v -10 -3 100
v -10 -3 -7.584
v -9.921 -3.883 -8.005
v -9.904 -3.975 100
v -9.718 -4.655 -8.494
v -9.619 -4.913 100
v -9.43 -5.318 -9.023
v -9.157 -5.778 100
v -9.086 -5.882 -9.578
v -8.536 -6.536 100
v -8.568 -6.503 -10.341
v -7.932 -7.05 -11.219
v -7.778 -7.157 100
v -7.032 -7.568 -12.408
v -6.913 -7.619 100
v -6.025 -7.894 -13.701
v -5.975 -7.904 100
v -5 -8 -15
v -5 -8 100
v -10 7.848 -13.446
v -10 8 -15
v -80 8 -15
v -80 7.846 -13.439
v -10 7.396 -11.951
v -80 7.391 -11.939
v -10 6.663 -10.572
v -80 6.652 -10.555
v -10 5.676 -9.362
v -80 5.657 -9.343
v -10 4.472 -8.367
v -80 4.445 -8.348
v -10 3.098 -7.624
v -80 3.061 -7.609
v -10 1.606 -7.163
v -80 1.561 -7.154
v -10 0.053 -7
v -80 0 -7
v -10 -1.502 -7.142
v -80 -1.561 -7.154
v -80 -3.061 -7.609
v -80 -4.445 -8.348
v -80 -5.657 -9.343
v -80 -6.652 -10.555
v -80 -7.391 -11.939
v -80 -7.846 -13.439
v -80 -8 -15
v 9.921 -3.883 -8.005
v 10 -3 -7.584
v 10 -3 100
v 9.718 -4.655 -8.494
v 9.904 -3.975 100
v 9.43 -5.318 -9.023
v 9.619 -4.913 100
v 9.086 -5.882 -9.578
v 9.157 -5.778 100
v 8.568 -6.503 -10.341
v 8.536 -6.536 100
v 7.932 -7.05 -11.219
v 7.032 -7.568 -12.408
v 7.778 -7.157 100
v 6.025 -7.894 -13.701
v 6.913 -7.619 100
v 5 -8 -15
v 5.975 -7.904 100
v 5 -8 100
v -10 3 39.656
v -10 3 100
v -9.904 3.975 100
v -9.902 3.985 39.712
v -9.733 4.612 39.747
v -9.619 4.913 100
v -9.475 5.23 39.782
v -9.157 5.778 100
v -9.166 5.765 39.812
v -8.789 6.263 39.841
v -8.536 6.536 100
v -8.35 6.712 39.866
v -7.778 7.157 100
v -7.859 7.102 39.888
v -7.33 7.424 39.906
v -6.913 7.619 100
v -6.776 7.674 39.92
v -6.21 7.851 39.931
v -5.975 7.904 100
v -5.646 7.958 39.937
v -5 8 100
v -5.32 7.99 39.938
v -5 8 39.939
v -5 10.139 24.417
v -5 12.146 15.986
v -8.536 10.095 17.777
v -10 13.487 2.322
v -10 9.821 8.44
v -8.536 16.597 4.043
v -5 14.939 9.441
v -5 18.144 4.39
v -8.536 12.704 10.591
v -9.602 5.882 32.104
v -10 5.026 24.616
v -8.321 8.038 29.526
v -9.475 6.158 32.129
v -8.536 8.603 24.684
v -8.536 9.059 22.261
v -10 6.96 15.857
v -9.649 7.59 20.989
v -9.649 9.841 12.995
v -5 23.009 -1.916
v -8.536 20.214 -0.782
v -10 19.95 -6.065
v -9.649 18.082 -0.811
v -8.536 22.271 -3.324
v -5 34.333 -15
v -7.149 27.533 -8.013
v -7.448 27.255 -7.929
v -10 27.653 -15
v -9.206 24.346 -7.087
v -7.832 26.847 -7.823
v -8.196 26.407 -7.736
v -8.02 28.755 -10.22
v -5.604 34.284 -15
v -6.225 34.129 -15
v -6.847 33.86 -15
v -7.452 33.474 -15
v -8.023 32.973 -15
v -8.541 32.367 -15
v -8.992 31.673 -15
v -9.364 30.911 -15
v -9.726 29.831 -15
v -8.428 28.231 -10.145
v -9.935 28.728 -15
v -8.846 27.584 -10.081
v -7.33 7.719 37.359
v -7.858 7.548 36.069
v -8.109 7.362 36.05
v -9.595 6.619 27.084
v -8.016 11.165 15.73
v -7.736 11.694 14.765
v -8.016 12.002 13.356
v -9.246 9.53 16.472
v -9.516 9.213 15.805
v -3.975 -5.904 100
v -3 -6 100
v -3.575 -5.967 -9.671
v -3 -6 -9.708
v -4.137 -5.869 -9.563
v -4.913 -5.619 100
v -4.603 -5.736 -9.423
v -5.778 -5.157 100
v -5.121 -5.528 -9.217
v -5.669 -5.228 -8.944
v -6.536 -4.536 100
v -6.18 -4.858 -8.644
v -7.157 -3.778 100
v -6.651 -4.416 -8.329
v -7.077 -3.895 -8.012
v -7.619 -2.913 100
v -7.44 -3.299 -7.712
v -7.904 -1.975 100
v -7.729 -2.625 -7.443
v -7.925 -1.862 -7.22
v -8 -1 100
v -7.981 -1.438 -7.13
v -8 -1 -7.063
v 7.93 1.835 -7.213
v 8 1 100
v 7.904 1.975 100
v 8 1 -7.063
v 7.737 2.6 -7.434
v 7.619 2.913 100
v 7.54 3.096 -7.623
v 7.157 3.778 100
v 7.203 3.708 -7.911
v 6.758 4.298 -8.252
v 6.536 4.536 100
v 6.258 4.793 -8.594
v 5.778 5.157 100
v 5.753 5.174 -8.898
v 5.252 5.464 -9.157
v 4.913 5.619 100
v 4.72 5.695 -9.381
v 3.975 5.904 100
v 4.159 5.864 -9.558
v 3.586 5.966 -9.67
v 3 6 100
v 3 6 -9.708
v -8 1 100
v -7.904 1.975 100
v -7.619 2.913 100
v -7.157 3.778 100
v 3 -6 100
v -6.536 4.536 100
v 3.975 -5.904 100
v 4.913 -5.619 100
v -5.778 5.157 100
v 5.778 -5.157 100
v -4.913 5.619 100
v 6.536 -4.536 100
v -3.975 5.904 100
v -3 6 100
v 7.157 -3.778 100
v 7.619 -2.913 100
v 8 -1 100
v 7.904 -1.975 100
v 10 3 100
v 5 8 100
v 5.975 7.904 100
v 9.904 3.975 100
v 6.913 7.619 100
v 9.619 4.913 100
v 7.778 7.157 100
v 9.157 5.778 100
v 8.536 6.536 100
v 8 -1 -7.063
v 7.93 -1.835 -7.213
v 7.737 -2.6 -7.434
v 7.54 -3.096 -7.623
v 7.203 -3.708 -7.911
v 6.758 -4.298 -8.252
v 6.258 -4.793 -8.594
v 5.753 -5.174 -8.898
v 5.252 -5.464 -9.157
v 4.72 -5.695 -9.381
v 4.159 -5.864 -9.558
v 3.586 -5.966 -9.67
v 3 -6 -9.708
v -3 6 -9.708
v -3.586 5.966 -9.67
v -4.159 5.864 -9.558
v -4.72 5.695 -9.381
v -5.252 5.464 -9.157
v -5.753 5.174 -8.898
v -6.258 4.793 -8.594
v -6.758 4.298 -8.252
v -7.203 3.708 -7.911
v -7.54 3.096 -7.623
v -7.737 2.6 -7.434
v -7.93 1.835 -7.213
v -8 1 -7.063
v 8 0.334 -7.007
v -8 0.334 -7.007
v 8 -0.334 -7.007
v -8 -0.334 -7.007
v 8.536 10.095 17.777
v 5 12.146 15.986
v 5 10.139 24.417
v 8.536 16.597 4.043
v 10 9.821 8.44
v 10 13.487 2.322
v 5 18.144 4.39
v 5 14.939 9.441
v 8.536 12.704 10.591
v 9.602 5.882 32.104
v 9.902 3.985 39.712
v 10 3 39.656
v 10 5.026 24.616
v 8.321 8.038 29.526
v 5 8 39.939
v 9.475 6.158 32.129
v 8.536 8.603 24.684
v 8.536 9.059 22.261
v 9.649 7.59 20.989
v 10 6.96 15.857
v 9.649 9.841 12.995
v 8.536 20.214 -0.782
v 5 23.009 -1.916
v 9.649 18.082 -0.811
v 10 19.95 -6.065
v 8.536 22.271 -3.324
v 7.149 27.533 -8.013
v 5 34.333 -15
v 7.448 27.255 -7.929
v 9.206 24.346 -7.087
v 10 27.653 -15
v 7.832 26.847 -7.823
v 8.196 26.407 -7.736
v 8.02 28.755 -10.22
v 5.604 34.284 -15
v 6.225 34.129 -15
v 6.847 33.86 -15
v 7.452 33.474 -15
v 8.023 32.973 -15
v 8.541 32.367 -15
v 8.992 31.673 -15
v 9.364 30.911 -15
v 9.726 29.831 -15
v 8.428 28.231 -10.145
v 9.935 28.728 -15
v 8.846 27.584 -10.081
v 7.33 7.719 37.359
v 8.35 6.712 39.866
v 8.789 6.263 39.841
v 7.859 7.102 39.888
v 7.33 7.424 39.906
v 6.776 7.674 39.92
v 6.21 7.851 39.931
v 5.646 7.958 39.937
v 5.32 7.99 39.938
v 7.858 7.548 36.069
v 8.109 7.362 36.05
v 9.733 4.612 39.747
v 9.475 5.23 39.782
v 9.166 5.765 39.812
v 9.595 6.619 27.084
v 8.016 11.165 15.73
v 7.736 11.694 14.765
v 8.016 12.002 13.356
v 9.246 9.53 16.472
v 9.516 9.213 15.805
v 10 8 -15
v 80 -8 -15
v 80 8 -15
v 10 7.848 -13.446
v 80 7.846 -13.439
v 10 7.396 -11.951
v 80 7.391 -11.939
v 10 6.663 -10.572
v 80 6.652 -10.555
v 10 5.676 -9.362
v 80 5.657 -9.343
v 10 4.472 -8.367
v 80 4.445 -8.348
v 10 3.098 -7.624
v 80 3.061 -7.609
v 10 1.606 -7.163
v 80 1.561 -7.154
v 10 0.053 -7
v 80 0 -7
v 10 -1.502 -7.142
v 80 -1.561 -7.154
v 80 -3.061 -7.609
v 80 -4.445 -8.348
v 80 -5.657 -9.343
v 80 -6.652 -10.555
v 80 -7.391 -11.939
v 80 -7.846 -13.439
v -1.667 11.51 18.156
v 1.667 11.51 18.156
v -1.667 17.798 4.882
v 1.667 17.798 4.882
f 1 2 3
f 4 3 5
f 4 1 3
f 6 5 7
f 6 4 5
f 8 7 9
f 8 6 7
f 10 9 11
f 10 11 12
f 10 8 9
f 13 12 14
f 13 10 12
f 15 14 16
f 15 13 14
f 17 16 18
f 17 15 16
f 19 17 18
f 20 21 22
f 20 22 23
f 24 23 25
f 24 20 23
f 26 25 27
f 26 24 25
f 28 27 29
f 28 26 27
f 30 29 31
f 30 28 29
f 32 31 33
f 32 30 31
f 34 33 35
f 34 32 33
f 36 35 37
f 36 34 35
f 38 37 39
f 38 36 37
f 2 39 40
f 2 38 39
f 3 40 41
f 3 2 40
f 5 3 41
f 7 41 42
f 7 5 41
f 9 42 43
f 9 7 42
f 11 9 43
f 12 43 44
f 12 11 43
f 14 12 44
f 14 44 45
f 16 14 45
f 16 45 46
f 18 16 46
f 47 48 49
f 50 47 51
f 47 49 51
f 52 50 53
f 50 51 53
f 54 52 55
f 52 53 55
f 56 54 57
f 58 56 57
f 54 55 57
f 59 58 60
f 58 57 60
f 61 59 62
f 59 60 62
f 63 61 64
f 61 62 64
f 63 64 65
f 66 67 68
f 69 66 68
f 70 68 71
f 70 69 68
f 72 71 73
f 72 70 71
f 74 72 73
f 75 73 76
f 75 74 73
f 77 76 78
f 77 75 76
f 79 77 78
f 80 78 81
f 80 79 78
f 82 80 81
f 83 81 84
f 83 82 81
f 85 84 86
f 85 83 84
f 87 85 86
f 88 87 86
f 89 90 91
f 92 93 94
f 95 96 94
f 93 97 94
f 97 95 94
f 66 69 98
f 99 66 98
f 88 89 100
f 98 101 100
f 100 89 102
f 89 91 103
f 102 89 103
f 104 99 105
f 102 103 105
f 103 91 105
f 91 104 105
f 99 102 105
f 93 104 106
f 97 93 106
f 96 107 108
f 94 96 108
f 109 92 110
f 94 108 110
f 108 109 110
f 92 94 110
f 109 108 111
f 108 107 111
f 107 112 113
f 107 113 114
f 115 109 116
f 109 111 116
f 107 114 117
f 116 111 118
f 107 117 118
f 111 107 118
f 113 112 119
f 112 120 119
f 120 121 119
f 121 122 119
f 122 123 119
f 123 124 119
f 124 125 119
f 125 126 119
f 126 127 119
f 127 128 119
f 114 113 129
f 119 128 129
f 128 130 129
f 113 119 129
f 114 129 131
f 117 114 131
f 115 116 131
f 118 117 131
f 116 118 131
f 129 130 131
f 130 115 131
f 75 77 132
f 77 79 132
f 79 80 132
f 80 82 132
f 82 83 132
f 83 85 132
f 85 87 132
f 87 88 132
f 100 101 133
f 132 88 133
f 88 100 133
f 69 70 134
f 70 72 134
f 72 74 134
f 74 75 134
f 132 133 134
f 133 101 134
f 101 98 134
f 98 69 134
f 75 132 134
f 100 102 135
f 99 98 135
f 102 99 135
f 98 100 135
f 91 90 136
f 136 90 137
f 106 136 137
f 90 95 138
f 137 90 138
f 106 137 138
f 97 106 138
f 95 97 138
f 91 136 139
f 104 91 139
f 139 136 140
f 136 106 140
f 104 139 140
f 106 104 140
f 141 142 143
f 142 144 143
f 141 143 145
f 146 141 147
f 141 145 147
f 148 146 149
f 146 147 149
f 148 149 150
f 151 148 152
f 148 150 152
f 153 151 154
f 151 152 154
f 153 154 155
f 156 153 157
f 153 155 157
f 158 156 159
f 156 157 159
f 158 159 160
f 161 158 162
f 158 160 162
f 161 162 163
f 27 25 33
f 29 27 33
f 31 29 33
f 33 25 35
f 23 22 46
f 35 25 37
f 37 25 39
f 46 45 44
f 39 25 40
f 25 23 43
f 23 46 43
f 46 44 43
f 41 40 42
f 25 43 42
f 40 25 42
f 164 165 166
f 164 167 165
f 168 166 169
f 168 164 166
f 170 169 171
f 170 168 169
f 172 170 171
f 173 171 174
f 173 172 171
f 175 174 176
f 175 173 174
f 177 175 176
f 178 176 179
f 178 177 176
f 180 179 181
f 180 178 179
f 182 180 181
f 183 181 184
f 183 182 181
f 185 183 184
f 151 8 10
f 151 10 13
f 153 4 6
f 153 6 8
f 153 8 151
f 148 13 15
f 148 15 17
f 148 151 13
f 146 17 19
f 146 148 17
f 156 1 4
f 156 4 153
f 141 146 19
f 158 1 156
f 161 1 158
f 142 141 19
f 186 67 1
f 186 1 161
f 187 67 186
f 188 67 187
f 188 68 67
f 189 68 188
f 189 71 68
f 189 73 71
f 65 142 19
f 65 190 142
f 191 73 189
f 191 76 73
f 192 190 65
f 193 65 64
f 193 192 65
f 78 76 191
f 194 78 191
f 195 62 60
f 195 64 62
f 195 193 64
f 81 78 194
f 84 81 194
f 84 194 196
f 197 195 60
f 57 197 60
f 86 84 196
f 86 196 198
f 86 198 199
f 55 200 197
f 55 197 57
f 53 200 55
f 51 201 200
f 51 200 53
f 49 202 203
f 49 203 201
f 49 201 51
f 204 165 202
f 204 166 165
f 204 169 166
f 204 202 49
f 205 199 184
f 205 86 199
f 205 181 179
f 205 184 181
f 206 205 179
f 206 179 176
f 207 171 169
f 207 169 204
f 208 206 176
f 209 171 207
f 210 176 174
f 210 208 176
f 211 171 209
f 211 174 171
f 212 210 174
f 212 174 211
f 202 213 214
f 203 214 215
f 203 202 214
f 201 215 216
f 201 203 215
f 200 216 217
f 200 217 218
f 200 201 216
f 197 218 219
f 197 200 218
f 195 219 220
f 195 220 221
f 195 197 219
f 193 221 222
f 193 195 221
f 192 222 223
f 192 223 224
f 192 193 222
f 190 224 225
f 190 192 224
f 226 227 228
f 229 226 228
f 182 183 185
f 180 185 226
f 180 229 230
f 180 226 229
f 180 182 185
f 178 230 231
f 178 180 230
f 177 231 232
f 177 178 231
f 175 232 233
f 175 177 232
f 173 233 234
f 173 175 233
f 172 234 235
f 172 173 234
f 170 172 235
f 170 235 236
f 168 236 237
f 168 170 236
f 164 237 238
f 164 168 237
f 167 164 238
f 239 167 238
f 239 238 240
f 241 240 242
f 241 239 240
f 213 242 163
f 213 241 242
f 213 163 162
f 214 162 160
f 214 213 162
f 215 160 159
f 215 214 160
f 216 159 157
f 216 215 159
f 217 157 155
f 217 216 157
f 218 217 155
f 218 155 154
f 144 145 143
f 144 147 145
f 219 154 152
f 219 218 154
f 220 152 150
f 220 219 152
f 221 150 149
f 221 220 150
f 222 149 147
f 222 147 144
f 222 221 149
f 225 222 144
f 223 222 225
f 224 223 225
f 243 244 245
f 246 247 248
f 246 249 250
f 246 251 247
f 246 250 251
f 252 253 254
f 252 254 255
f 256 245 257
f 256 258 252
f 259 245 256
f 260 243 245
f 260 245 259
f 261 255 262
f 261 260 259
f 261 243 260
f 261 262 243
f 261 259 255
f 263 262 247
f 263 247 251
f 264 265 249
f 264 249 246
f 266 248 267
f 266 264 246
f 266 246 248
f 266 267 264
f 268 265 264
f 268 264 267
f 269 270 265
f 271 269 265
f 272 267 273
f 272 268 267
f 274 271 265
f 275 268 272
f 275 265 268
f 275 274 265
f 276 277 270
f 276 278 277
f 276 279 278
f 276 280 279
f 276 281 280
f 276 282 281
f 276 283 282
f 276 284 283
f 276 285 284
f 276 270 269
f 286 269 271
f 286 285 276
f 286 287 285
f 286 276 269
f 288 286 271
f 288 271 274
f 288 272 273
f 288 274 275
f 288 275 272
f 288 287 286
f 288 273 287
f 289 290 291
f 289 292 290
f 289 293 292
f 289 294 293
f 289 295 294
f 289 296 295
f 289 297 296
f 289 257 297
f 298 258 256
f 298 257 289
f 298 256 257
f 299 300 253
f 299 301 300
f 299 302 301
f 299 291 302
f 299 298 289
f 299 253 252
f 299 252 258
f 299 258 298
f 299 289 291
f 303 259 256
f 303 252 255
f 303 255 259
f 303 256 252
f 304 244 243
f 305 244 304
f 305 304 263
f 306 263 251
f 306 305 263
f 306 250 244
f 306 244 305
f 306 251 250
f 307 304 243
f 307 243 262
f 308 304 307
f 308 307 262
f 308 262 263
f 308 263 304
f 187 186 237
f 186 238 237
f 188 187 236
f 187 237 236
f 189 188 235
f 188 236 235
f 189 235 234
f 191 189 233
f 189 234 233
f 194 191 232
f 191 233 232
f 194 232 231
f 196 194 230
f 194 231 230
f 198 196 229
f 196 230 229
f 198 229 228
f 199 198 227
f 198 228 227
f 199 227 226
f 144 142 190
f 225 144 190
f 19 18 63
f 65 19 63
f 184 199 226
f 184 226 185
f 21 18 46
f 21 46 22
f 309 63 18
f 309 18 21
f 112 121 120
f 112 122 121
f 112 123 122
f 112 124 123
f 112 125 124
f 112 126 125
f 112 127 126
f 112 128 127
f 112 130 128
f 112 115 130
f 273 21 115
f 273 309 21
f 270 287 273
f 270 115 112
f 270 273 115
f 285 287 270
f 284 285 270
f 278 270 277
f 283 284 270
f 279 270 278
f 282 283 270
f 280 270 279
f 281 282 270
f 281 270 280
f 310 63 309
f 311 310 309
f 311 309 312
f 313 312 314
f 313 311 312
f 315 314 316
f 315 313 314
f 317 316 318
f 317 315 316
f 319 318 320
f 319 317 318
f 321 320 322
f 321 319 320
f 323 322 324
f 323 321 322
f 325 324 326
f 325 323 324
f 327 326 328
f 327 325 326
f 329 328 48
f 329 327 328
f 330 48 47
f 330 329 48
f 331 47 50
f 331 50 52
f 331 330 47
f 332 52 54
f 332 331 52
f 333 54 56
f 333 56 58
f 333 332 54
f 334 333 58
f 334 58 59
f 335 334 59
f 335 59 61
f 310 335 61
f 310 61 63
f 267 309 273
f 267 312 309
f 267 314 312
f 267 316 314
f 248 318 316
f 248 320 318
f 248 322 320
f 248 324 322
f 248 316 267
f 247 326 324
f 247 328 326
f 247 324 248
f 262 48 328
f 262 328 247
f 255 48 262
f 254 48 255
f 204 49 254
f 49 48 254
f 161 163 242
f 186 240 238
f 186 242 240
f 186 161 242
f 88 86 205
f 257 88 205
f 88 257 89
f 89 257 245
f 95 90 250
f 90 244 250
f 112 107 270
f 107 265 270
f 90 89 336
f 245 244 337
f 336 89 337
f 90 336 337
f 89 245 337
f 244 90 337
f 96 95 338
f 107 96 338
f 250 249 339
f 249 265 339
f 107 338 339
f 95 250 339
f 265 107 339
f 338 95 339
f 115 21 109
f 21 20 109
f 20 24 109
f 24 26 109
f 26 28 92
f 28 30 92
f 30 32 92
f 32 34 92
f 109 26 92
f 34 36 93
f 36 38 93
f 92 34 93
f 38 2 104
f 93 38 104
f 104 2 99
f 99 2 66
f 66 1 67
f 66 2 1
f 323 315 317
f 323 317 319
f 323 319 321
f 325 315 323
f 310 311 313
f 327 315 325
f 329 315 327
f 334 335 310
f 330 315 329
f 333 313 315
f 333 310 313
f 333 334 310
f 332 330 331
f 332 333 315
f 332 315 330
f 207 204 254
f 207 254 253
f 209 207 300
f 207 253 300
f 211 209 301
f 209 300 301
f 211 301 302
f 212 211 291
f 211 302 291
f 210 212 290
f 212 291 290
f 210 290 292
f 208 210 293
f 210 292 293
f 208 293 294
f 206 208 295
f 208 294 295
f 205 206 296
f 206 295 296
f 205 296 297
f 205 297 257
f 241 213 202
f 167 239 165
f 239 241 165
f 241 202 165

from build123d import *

# Parameters (mm, degrees)
F0_W          = 20
F0_H          = 16
F1_DEPTH      = 100
F1_DEPTH_BACK = 15
F2_T          = -2
F3_R          = 6.65
F4_DEPTH      = 25
F9_DEPTH      = 20
F10_R         = 5


with BuildPart() as f1:
    # F0 (on Top) → F1 (new body, two sides)
    with BuildSketch(Plane.XY) as f1_sk:
        Rectangle(F0_W, F0_H)
    extrude(amount=F1_DEPTH)
    extrude(f1_sk.sketch, amount=-F1_DEPTH_BACK)

    # F2
    f2_openings = [f1.faces().sort_by_distance(p)[0] for p in [
        (0, 0, 100),
    ]]
    offset(amount=F2_T, openings=f2_openings)

    # F3 (on Top) → F4 (cut)
    with BuildSketch(Plane.XY):
        with Locations((-23, 31)):
            Circle(F3_R)
    extrude(amount=F4_DEPTH, mode=Mode.SUBTRACT)

    # F7: sweep along a path in F6
    with BuildLine(Plane(origin=(0, 0, -15), x_dir=(1, 0, 0), z_dir=(0, 0, -1))) as f7_path:
        Line((-80, 0), (80, 0))
    # F5 (on face) → F7 (sweep)
    with BuildSketch(Plane.YZ.offset(10)):
        with BuildLine():
            Line((-8, -15), (8, -15))
            ThreePointArc((8, -15), (0, -7), (-8, -15))
        make_face()
    sweep(path=f7_path.line)

    # F8 (on face) → F9 (join)
    with BuildSketch(Plane.YZ.offset(10)):
        with BuildLine():
            Line((8, 39.9389689904), (8, -15))
            Line((8, -15), (34.332793206, -15))
            add(Edge.make_bspline(
                [(8, 39.9389689904), (8.920262118, 31.8490776814), (10.8133224807, 17.1951366341), (17.1653233274, 4.3539788499), (28.0984148898, -7.9715894697), (34.332793206, -15)],
                knots=[0.0556572186, 0.0556572186, 0.0556572186, 0.0556572186, 0.3658143049, 0.6383682032, 1, 1, 1, 1], degree=3))
        make_face()
    extrude(amount=-F9_DEPTH)

    # F10
    f10_edges = [f1.edges().sort_by_distance(p)[0] for p in [
        (-8, -6, 45.145751),
        (8, -6, 45.145751),
        (10, -8, 42.5),
        (-10, -8, 42.5),
        (8, 6, 45.145751),
        (-8, 6, 45.145751),
        (10, 8, 69.969484),
        (-10, 8, 69.969484),
        (10, 14.887336, 9.5352),
        (-10, 14.887336, 9.5352),
    ]]
    fillet(f10_edges, radius=F10_R)


solid = f1.part
